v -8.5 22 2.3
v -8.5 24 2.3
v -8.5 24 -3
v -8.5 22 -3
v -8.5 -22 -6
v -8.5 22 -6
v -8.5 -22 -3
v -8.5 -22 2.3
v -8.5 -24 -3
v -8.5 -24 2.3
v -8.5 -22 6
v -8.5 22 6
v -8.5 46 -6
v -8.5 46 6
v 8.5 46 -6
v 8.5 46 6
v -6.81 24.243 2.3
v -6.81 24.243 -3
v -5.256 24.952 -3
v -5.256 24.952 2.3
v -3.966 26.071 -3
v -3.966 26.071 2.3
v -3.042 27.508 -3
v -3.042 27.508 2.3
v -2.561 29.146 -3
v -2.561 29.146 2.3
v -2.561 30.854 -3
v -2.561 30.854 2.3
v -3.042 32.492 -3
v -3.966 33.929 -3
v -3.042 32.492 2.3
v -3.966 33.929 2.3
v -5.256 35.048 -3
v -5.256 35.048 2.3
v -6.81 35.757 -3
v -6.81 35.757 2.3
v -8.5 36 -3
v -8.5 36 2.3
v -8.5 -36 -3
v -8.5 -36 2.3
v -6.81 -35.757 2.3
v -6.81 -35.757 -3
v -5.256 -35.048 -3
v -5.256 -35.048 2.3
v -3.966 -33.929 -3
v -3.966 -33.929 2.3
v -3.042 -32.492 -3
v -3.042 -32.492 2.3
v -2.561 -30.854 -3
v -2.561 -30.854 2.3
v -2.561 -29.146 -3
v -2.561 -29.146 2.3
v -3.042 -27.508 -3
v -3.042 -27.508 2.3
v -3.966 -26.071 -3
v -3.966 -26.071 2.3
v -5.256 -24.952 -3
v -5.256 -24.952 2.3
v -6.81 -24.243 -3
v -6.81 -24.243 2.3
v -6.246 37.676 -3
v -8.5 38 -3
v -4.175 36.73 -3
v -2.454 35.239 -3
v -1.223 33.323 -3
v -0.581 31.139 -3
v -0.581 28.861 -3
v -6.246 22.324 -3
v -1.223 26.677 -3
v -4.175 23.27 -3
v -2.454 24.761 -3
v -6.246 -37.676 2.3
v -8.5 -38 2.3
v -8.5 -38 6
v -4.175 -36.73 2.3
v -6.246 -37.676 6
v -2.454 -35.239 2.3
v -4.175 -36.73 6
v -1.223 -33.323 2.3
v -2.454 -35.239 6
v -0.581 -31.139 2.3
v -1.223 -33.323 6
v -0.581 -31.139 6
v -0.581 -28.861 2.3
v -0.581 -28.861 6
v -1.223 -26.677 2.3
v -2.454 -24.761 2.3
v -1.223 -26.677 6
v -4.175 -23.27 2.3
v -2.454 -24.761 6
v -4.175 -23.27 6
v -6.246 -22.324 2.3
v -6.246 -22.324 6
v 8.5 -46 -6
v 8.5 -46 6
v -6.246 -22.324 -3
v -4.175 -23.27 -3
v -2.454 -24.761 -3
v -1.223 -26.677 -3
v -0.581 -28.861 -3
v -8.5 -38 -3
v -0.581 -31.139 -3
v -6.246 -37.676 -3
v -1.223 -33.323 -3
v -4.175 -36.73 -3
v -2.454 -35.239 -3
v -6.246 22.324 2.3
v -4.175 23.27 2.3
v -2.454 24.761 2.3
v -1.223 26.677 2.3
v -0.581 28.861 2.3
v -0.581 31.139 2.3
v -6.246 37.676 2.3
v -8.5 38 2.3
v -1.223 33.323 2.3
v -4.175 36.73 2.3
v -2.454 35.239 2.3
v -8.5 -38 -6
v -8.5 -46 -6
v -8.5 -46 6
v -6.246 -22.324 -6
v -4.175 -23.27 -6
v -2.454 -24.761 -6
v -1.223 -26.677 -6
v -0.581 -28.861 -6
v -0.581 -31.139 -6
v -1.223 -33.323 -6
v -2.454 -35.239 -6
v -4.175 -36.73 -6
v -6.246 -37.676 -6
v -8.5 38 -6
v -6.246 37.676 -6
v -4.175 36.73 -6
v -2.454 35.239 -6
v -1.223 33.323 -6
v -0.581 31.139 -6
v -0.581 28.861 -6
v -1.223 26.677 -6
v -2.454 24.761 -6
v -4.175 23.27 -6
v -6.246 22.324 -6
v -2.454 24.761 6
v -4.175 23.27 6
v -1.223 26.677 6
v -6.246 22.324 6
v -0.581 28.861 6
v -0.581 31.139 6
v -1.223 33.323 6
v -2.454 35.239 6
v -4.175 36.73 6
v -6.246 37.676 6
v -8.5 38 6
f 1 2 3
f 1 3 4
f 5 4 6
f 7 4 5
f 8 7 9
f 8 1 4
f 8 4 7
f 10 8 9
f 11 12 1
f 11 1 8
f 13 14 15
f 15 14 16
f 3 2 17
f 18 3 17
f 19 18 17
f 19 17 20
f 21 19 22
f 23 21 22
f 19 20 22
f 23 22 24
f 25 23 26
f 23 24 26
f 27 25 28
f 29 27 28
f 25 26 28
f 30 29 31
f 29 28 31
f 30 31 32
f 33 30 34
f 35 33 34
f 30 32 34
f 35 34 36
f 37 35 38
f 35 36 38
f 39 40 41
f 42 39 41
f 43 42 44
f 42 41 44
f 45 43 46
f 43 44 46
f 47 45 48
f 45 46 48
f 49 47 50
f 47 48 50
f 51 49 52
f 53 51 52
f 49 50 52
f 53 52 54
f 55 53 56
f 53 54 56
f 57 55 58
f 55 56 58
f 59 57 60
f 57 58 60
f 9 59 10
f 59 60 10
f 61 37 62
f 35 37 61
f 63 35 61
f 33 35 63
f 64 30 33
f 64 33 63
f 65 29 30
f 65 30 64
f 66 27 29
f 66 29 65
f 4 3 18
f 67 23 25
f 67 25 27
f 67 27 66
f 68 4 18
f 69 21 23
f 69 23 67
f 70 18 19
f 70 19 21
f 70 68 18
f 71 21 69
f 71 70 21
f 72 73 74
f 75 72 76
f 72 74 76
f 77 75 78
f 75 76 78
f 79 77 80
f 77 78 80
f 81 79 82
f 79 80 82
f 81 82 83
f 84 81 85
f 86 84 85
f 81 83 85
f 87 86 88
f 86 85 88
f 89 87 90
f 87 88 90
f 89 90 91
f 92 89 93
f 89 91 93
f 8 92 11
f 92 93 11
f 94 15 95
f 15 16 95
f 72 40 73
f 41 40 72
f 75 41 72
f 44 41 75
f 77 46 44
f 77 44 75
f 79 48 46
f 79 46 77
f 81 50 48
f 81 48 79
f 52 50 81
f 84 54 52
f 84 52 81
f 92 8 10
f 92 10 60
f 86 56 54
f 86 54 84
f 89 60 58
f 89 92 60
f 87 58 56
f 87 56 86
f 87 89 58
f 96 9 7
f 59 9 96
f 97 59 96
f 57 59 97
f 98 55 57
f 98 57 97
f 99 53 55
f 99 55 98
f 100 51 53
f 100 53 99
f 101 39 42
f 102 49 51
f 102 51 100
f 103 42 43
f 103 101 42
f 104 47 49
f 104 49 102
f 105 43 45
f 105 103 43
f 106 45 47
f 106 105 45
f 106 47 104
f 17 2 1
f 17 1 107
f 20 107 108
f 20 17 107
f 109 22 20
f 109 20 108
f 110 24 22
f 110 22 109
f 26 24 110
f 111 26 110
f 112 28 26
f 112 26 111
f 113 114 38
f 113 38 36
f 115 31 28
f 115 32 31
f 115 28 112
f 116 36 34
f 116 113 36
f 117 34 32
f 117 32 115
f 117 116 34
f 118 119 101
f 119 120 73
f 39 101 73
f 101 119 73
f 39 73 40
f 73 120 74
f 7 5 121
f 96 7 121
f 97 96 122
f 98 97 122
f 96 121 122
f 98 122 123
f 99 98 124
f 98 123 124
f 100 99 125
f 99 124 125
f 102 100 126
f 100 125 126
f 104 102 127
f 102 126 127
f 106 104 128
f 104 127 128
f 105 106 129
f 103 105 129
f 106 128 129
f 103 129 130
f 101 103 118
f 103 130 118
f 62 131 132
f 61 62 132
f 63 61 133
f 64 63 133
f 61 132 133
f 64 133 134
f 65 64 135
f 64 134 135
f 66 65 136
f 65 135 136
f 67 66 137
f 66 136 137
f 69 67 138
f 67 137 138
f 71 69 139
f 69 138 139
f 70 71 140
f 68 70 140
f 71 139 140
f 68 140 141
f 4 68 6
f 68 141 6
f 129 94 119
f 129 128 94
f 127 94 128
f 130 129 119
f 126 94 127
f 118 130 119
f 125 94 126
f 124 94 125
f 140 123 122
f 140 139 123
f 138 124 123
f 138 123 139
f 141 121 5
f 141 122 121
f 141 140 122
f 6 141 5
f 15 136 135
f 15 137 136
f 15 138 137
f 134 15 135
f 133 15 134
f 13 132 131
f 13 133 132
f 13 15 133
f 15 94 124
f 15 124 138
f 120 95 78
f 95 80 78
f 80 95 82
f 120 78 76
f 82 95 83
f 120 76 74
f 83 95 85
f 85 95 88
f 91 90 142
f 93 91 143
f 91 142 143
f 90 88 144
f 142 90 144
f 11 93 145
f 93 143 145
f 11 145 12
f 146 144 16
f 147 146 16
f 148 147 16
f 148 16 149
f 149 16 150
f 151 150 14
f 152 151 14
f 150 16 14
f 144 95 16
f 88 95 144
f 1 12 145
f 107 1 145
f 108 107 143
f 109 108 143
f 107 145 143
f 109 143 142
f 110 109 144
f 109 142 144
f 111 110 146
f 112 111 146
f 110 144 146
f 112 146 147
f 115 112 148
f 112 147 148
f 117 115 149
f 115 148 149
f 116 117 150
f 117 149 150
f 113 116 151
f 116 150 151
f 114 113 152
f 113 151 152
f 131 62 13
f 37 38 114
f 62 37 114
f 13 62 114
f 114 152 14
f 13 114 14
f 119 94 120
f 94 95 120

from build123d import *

# Parameters (mm, degrees)
PAD_DEPTH       = 6
POCKET_DEPTH    = 3.7
POCKET001_DEPTH = 3


with BuildPart() as part:
    # Sketch → Pad (new body, symmetric)
    with BuildSketch(Plane.XY):
        with BuildLine():
            Line((-8.5, 36), (-8.5, 46))
            Line((-8.5, 46), (8.5, 46))
            Line((8.5, 46), (8.5, -46))
            Line((8.5, -46), (-8.500001, -46))
            Line((-8.500001, -46), (-8.500001, -36))
            ThreePointArc((-8.500001, -36), (-2.5, -30), (-8.5, -24))
            Line((-8.5, 24), (-8.5, -24))
            ThreePointArc((-8.5, 24), (-2.5, 30), (-8.5, 36))
        make_face()
    extrude(amount=PAD_DEPTH, both=True)

    # Sketch001 → Pocket (cut)
    with BuildSketch(Plane.XY.offset(6)):
        with BuildLine():
            ThreePointArc((-8.500034, -38), (-0.500033, -30.000017), (-8.5, -22))
            Line((-8.5, -22), (-18.5, -21.999958))
            Line((-18.5, -21.999958), (-18.5, -38))
            Line((-18.5, -38), (-8.500034, -38))
        make_face()
        with BuildLine():
            ThreePointArc((-8.5, 22), (-0.5, 30), (-8.5, 38))
            Line((-8.5, 38), (-18.5, 38))
            Line((-18.5, 38), (-18.5, 22))
            Line((-18.5, 22), (-8.5, 22))
        make_face()
    extrude(amount=-POCKET_DEPTH, mode=Mode.SUBTRACT)

    # Sketch002 → Pocket001 (cut)
    with BuildSketch(Plane(origin=(0, 0, -6), x_dir=(1, 0, 0), z_dir=(0, 0, -1))):
        with BuildLine():
            ThreePointArc((-8.5, 22), (-0.5, 30), (-8.5, 38))
            Line((-8.5, 38), (-24.5, 38))
            Line((-24.5, 38), (-24.5, 22))
            Line((-24.5, 22), (-8.5, 22))
        make_face()
        with BuildLine():
            ThreePointArc((-8.5, -38), (-0.5, -30), (-8.5, -22))
            Line((-8.5, -22), (-24.5, -22))
            Line((-24.5, -22), (-24.5, -38))
            Line((-24.5, -38), (-8.5, -38))
        make_face()
    extrude(amount=-POCKET001_DEPTH, mode=Mode.SUBTRACT)


solid = part.part
